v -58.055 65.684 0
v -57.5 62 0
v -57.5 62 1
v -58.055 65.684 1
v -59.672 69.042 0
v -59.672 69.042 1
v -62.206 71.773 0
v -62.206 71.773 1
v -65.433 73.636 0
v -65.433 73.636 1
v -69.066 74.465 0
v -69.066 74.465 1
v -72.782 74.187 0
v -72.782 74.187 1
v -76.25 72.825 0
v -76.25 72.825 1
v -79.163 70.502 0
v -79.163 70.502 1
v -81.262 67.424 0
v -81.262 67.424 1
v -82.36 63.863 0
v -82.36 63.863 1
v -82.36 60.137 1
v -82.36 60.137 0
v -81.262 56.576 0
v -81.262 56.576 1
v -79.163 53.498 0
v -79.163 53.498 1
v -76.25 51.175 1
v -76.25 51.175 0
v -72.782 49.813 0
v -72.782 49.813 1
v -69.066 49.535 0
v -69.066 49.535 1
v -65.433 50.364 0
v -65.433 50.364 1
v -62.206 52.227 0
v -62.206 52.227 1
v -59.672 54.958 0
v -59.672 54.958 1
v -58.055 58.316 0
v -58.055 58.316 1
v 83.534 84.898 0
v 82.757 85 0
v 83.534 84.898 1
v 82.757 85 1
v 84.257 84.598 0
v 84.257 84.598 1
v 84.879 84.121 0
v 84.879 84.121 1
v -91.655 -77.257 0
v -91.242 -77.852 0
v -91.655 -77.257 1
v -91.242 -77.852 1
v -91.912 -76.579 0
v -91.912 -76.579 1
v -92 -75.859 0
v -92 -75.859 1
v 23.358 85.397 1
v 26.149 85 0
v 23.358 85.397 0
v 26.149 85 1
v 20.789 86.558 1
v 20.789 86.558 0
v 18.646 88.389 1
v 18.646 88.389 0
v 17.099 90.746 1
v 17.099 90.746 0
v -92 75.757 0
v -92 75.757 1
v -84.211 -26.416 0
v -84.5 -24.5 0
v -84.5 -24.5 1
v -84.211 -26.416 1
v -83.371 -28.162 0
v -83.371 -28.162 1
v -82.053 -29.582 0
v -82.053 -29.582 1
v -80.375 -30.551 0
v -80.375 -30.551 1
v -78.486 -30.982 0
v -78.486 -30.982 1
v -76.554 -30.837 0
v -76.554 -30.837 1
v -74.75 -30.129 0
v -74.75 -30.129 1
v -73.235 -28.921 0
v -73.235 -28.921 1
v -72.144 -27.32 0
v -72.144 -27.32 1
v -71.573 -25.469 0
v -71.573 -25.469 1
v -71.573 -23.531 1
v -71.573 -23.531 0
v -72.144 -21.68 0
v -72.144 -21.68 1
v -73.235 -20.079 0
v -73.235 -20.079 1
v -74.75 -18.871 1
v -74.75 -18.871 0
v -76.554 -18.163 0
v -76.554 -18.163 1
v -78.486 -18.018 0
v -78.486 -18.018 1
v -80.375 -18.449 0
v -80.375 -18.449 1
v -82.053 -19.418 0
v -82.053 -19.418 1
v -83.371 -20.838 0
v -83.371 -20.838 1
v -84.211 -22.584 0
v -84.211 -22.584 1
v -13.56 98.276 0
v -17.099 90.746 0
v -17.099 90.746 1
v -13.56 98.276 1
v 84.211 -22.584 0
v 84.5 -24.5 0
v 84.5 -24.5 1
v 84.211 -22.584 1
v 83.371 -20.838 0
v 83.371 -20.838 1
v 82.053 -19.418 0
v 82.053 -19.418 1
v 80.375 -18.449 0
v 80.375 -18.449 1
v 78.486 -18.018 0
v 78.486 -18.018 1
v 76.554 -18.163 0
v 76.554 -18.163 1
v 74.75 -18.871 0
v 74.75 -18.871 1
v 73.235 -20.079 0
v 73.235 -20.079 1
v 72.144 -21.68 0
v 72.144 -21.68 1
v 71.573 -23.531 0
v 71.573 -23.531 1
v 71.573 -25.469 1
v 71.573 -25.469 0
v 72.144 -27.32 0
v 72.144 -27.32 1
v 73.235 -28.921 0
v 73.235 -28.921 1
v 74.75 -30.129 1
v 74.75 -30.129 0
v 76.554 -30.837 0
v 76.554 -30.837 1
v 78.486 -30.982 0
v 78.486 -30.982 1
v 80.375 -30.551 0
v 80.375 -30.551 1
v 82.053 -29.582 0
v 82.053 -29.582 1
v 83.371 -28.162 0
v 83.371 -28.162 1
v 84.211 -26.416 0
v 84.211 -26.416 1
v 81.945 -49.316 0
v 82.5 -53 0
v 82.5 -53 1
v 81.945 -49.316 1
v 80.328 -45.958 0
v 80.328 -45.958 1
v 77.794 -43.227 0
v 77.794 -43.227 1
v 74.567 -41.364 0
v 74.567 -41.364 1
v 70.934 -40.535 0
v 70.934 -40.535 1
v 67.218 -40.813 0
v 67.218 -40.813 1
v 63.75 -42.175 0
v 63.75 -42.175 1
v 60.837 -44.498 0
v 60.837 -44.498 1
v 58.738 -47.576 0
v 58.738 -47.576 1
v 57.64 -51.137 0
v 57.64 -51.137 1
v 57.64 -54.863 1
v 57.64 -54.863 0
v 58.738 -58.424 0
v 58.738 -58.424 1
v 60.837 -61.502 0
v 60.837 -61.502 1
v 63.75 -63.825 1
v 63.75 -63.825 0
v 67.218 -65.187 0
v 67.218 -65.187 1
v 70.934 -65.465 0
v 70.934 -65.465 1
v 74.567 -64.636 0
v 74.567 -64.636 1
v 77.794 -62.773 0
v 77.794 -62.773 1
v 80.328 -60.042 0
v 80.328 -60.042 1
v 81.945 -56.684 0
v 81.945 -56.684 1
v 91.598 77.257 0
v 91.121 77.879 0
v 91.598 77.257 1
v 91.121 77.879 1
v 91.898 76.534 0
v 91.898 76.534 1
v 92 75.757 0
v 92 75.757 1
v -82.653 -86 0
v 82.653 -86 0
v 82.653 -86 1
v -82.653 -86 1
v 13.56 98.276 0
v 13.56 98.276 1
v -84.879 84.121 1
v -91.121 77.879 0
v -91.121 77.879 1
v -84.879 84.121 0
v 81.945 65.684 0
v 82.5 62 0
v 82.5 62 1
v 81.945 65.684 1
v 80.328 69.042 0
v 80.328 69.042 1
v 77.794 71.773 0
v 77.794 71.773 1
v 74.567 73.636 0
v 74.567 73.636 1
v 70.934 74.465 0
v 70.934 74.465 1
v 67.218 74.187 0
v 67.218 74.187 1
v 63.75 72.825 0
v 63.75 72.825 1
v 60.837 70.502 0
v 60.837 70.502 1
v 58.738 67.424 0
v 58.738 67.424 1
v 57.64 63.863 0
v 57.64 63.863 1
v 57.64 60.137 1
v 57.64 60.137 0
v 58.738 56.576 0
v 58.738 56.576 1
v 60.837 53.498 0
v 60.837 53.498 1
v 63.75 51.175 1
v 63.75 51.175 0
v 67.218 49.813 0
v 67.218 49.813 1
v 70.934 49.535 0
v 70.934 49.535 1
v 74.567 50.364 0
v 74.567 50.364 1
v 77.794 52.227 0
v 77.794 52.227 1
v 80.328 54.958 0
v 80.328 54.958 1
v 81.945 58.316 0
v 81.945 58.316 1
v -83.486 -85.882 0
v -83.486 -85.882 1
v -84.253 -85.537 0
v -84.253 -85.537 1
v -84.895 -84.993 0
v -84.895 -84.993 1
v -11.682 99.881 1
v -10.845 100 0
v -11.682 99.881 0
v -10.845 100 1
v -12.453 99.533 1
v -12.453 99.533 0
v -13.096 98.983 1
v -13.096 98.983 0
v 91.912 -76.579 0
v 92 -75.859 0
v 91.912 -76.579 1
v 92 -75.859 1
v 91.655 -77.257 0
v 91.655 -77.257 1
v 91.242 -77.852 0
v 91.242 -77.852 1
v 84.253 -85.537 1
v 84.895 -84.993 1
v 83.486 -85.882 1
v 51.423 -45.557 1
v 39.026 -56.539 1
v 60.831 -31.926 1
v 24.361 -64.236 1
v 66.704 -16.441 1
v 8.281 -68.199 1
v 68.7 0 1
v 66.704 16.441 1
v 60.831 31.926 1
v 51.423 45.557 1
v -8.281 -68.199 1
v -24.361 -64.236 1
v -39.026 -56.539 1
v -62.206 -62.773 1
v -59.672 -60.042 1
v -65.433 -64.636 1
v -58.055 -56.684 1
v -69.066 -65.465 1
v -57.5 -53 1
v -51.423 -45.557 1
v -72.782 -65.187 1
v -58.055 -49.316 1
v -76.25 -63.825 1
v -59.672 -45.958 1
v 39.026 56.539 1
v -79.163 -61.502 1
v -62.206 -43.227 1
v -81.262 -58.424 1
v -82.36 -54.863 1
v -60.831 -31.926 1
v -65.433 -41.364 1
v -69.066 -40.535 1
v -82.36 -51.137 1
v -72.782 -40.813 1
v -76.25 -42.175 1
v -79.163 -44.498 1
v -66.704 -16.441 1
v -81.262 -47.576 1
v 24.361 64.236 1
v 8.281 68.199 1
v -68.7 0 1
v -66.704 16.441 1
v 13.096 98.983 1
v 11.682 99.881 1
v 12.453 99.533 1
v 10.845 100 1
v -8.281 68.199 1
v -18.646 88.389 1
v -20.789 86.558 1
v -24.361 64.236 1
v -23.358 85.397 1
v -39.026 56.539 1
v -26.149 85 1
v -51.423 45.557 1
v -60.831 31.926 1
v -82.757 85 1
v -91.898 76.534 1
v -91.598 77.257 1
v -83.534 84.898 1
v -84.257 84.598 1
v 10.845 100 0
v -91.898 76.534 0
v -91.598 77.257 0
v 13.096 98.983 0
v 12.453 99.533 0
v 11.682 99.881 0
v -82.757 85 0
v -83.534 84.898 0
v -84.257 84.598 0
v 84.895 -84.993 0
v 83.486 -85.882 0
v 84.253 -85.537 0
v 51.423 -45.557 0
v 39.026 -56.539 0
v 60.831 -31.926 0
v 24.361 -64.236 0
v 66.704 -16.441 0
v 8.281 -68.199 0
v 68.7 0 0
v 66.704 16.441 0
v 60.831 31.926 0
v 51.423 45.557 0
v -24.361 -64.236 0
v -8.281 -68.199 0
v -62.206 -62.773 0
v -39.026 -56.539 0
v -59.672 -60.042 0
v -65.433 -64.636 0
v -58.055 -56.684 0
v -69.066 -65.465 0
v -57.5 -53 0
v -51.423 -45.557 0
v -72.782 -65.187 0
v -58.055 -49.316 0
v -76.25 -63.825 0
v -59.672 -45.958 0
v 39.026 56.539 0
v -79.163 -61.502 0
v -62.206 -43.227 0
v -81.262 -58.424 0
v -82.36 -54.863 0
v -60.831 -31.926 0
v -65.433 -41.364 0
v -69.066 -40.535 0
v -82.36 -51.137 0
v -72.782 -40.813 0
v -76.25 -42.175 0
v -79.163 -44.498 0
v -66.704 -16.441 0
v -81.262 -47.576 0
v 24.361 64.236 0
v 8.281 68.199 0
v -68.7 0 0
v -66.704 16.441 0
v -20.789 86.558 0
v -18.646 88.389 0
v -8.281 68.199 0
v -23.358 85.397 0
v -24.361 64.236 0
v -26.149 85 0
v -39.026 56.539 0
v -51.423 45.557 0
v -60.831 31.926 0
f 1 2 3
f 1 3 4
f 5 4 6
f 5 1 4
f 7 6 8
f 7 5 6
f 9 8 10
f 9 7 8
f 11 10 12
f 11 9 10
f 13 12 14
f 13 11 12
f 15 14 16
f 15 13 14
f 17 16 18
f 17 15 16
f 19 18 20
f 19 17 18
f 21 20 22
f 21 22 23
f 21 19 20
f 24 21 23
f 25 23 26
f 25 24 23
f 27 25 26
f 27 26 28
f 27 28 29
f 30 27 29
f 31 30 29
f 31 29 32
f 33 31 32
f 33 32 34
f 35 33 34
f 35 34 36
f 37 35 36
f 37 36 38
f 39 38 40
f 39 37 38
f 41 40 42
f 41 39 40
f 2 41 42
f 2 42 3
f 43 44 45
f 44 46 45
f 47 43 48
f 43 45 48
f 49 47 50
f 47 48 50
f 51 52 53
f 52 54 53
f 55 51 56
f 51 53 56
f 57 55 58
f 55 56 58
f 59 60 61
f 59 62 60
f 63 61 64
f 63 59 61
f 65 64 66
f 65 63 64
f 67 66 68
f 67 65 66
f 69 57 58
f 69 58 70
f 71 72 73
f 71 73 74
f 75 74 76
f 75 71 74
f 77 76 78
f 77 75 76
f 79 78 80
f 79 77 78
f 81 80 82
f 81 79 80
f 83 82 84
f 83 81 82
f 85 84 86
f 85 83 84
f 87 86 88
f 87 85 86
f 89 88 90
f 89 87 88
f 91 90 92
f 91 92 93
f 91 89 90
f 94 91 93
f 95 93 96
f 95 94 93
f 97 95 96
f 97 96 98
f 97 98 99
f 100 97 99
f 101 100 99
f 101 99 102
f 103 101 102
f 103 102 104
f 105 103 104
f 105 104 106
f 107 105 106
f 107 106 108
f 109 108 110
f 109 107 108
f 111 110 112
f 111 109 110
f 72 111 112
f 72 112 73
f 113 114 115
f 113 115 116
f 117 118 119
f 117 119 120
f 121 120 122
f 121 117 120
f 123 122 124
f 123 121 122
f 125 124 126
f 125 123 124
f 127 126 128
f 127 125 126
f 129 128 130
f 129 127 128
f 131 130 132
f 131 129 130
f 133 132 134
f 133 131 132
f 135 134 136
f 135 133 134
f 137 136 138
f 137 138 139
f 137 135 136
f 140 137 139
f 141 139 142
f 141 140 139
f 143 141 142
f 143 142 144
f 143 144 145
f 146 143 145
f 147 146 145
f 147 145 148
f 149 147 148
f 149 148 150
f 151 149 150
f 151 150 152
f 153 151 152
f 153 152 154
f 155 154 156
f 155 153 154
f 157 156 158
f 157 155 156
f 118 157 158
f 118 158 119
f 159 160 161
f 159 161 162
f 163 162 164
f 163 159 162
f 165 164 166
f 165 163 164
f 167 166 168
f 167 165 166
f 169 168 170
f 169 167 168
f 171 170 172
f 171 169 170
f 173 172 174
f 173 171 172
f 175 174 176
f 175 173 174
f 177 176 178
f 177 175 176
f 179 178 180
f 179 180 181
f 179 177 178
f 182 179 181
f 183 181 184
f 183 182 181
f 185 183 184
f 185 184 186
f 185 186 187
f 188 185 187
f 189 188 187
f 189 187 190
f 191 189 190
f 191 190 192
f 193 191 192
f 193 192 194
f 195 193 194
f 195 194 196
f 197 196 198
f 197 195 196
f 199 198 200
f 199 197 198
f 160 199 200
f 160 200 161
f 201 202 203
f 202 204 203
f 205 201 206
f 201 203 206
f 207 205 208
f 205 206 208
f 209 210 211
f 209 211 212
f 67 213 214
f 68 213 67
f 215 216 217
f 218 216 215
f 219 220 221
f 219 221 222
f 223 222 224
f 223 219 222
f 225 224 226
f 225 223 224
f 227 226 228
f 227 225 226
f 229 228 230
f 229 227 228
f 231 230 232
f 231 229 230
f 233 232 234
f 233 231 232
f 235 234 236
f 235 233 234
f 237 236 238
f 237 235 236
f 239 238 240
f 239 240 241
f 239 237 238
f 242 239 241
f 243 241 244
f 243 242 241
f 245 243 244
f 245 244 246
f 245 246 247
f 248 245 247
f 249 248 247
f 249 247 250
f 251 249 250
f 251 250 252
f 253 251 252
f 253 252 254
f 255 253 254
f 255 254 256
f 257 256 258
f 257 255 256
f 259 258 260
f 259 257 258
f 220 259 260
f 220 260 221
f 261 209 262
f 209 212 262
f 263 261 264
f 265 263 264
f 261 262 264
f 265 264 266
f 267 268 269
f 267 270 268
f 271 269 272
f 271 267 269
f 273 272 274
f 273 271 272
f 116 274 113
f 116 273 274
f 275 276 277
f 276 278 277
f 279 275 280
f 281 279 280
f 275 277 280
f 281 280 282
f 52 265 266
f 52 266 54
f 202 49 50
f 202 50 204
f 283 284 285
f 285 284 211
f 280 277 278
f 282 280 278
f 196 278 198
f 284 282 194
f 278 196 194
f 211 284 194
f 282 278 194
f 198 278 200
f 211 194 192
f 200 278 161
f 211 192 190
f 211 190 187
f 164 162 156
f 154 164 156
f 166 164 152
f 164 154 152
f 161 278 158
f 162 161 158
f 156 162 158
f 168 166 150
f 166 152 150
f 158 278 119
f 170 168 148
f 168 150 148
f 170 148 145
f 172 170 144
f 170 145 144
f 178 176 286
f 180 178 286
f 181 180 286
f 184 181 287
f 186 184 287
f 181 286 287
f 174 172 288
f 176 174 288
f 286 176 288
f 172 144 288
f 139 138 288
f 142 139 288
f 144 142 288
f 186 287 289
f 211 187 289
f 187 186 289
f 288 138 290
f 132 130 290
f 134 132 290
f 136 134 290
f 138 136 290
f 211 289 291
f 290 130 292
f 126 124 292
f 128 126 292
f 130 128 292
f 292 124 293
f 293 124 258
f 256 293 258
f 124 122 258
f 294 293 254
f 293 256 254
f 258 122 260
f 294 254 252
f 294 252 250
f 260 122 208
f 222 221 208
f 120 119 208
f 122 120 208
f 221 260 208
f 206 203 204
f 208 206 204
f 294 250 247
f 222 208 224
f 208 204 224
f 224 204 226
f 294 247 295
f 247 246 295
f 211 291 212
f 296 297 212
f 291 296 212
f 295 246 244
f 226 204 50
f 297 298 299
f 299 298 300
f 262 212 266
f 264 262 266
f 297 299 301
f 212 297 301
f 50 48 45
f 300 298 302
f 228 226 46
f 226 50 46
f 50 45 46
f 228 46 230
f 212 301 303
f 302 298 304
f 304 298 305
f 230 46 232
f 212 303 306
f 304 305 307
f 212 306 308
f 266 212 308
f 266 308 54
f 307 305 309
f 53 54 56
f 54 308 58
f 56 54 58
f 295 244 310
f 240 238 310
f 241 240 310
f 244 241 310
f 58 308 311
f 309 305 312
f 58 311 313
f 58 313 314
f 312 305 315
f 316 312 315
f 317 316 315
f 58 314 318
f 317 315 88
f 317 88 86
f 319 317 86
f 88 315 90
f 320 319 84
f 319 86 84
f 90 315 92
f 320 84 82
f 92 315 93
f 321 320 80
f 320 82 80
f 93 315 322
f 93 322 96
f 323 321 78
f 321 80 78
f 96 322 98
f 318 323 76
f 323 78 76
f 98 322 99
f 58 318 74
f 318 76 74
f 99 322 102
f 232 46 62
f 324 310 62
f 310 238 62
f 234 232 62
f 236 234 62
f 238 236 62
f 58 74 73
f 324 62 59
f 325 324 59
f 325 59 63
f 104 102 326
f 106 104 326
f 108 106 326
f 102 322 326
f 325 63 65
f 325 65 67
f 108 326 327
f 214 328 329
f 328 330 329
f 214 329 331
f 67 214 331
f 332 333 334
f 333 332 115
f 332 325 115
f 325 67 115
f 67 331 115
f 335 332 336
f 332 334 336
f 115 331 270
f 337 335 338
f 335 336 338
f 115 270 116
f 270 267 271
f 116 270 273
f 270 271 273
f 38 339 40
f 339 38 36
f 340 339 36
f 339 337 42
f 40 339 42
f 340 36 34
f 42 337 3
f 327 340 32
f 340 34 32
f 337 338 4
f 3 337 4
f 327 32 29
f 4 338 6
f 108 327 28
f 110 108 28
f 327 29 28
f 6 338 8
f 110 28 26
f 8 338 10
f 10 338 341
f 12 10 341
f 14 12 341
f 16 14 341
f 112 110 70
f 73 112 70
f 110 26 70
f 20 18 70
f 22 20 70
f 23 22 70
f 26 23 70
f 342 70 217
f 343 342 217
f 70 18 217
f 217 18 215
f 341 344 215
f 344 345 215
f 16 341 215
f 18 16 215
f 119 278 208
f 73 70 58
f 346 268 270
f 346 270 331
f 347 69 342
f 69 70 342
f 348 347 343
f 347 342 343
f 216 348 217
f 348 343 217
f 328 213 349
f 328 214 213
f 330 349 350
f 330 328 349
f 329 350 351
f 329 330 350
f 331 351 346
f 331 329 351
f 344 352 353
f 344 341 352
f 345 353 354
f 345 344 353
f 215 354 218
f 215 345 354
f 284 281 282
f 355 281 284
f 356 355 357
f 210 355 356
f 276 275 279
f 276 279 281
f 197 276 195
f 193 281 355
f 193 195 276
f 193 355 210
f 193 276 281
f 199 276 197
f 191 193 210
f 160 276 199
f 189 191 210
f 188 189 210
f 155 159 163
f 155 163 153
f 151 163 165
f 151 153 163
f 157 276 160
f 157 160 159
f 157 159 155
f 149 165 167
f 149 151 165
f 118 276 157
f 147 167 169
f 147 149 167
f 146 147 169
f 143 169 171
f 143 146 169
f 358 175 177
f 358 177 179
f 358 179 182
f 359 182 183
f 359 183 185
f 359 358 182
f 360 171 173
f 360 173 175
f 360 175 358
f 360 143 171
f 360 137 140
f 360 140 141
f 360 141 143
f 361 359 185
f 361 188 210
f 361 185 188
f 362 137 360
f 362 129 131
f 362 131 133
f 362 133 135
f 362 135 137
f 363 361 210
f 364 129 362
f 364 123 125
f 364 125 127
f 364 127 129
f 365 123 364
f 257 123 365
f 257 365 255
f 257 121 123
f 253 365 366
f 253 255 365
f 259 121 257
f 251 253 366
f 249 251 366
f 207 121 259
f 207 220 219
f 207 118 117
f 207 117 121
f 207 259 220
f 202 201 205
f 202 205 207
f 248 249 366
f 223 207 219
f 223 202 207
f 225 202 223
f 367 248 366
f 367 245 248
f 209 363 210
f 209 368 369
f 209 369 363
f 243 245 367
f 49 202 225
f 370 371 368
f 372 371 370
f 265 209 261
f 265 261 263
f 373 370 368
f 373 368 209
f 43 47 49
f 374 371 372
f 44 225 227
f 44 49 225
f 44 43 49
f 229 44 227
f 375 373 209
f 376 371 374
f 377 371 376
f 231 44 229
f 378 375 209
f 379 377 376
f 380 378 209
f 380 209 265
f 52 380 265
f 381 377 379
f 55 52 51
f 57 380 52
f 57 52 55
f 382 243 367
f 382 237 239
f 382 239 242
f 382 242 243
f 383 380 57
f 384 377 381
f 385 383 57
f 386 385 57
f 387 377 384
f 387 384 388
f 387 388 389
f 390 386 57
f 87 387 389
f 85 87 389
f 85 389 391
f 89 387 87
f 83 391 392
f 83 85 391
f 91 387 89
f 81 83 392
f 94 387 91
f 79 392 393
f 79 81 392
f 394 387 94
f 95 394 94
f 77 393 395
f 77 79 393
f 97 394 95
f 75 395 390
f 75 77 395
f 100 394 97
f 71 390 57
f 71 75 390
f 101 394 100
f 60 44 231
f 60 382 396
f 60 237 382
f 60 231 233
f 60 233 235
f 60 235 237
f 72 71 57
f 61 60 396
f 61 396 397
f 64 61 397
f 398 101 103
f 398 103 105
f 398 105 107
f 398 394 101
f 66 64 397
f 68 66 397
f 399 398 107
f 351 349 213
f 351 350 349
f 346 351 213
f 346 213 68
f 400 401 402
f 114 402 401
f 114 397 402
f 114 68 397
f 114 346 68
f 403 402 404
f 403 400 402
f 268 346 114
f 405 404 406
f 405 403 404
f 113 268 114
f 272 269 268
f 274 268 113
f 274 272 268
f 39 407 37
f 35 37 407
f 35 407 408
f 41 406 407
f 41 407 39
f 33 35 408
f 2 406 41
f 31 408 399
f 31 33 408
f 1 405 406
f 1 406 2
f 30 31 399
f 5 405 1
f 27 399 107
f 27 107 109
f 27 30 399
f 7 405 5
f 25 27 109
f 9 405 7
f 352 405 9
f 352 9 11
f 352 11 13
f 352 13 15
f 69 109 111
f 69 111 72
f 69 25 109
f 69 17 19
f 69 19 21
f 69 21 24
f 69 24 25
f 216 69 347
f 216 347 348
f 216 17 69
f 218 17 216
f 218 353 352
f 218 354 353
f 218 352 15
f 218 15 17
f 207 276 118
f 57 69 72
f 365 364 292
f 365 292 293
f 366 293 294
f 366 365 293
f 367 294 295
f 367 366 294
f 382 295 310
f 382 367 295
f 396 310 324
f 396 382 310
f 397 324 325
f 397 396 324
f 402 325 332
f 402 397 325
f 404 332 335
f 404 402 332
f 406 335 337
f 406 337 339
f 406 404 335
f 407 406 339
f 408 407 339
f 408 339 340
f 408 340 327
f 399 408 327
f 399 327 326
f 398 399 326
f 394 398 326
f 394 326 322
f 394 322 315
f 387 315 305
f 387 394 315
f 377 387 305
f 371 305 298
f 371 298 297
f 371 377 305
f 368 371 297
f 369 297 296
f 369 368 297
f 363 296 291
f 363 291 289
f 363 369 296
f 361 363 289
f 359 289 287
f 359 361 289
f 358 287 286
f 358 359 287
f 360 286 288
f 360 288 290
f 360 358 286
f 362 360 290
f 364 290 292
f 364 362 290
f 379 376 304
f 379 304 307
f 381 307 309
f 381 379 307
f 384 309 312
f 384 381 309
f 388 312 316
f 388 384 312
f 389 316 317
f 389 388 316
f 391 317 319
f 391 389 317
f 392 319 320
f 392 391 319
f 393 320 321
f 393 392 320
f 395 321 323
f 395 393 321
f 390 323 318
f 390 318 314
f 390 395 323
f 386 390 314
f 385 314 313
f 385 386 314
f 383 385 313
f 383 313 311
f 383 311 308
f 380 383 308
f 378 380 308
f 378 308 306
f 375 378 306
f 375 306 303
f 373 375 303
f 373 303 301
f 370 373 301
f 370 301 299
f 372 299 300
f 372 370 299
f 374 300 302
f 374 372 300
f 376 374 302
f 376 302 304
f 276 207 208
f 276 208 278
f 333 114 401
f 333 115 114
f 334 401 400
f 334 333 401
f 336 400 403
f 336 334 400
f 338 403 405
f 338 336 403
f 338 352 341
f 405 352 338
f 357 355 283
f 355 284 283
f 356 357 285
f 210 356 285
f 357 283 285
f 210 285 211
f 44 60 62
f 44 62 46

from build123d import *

# Parameters (mm, degrees)
SKETCH1_R      = 6.5
SKETCH1_R_2    = 68.7
SKETCH1_R_3    = 12.5
EXTRUDE1_DEPTH = 1
FILLET1_R      = 10
FILLET2_R      = 3


with BuildPart() as part:
    # Sketch1 → Extrude1 (new body)
    with BuildSketch(Plane.XY):
        Polygon((84, 85), (92, 77), (92, -77), (84, -86), (-84, -86), (-92, -77), (-92, 77), (-84, 85), (-19.8, 85), (-12.75, 100), (12.75, 100), (19.8, 85), align=None)
        with Locations(Location((-78, -24.5, 0), (0, 0, 180))):
            Circle(SKETCH1_R, mode=Mode.SUBTRACT)
        Circle(SKETCH1_R_2, mode=Mode.SUBTRACT)
        with Locations((-70, 62)):
            Circle(SKETCH1_R_3, mode=Mode.SUBTRACT)
        with Locations((70, 62)):
            Circle(SKETCH1_R_3, mode=Mode.SUBTRACT)
        with Locations((-70, -53)):
            Circle(SKETCH1_R_3, mode=Mode.SUBTRACT)
        with Locations((70, -53)):
            Circle(SKETCH1_R_3, mode=Mode.SUBTRACT)
        with Locations((78, -24.5)):
            Circle(SKETCH1_R, mode=Mode.SUBTRACT)
    extrude(amount=EXTRUDE1_DEPTH)

    # Fillet1
    fillet1_edges = [part.edges().sort_by_distance(p)[0] for p in [
        (-19.8, 85, 0.5),
        (19.8, 85, 0.5),
    ]]
    fillet(fillet1_edges, radius=FILLET1_R)

    # Fillet2
    fillet2_edges = [part.edges().sort_by_distance(p)[0] for p in [
        (92, -77, 0.5),
        (84, -86, 0.5),
        (-84, -86, 0.5),
        (-92, -77, 0.5),
        (-92, 77, 0.5),
        (-84, 85, 0.5),
        (-12.75, 100, 0.5),
        (12.75, 100, 0.5),
        (84, 85, 0.5),
        (92, 77, 0.5),
    ]]
    fillet(fillet2_edges, radius=FILLET2_R)


solid = part.part
